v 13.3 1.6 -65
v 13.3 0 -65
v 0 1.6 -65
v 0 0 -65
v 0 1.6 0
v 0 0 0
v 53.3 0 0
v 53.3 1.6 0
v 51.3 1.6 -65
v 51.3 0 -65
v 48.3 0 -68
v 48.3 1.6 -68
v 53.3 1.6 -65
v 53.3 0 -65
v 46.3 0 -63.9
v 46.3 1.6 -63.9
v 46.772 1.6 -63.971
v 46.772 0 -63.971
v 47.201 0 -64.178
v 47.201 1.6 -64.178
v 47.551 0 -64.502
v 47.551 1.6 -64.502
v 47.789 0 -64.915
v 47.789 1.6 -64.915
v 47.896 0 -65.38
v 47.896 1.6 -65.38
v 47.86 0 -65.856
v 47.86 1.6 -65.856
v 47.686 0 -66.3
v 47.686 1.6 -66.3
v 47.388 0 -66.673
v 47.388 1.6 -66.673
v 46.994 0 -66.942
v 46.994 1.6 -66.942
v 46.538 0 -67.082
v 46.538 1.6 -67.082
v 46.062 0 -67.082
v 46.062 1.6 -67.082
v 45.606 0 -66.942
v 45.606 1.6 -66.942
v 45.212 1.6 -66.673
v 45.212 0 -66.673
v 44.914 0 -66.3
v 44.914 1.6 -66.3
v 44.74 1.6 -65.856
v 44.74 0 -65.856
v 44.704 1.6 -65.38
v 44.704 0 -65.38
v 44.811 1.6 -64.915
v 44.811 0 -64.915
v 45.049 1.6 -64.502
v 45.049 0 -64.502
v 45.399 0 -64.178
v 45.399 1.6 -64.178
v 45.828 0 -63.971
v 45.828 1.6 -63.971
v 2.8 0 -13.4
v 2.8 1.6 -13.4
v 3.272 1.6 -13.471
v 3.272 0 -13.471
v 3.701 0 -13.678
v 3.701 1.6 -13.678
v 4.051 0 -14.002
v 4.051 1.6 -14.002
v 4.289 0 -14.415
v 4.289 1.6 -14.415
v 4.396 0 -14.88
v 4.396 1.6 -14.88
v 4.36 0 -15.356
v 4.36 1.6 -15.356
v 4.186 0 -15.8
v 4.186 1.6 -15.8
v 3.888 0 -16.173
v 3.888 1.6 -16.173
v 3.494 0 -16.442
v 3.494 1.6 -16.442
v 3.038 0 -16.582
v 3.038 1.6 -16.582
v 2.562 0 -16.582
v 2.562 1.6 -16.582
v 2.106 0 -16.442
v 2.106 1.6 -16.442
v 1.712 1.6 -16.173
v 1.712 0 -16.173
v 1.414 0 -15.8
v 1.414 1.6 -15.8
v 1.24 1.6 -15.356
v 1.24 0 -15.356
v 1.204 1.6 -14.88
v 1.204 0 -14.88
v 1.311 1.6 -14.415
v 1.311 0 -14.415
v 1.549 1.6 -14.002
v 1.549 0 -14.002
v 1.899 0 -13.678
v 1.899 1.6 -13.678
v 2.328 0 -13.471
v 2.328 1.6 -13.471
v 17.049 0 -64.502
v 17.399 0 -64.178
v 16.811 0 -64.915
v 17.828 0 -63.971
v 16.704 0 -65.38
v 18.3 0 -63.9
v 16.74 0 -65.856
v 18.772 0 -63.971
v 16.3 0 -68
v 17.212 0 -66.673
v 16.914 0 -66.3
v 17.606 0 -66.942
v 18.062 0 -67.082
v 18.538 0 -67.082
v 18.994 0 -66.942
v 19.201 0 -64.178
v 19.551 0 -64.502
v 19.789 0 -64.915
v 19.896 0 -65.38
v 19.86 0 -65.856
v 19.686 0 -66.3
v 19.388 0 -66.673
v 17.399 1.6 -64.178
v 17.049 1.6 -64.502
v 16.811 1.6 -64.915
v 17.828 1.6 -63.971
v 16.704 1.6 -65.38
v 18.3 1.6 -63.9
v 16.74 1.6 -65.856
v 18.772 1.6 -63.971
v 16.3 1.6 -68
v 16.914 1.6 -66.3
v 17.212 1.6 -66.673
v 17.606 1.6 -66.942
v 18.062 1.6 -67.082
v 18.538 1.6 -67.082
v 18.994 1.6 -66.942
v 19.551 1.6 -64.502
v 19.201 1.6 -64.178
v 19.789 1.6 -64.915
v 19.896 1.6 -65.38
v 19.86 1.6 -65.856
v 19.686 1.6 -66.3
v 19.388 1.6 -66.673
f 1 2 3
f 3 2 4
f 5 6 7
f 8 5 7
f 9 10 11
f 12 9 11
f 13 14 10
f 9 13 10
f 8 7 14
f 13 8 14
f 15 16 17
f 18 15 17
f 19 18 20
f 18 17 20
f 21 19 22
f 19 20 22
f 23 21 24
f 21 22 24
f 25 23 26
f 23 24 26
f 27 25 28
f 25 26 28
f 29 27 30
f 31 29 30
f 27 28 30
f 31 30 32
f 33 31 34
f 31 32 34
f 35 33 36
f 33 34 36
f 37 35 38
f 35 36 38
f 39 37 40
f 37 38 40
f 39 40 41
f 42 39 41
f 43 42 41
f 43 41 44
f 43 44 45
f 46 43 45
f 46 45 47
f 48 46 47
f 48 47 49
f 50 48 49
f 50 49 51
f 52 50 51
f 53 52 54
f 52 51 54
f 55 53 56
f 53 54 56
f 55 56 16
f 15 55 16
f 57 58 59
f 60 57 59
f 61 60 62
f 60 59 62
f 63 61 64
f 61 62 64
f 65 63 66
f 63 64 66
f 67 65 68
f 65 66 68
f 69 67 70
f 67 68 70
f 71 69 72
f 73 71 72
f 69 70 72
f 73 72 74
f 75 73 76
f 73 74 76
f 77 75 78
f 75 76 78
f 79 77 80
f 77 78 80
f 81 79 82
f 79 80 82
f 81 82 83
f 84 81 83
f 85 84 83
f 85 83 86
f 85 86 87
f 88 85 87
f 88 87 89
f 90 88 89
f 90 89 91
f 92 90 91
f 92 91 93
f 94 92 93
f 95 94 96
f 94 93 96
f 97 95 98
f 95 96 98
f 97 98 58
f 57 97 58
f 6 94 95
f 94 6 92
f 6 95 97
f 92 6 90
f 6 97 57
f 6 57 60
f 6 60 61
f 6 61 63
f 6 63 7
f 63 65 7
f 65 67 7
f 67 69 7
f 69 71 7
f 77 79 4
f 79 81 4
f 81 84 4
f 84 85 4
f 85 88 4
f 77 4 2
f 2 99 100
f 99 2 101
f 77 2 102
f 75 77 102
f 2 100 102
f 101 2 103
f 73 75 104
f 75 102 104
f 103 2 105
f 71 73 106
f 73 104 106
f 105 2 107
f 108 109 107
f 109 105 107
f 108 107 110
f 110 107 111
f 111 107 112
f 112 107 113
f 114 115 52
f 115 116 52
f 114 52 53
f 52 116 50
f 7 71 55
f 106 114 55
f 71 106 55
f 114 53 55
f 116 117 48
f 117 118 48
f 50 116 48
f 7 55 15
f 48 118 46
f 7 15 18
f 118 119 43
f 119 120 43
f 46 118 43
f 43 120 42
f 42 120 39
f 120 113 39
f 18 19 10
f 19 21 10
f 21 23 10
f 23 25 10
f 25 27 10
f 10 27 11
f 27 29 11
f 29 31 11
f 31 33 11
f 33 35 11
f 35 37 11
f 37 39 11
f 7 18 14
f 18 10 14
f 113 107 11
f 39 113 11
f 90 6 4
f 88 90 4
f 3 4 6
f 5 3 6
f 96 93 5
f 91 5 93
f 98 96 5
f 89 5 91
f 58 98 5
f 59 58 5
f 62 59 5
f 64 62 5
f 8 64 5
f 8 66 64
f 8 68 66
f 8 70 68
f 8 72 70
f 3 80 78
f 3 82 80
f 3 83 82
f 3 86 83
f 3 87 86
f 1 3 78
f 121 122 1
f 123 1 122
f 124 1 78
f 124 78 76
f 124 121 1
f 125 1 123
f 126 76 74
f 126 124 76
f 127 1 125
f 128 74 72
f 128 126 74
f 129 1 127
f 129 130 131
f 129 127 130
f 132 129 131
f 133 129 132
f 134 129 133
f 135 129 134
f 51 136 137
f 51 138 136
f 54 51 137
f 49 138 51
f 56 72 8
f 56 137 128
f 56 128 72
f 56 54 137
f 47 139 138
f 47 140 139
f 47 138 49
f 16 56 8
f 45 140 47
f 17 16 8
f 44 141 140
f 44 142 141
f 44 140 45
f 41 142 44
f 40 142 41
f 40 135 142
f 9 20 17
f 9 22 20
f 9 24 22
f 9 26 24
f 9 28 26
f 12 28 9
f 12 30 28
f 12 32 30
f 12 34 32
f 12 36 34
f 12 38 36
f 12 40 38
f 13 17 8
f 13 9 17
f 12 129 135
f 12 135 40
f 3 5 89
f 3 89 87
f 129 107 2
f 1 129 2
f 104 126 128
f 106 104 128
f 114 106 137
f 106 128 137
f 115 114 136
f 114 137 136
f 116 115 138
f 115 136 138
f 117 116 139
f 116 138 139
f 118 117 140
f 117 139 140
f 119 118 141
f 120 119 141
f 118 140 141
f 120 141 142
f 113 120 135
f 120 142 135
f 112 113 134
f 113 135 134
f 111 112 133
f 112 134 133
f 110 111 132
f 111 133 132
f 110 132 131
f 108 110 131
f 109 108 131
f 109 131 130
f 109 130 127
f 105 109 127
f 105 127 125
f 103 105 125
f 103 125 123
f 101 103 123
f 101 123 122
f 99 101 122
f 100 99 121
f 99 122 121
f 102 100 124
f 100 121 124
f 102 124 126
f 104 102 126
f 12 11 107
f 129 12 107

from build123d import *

# Parameters (mm, degrees)
BOSS_EXTRUDE1_DEPTH = 1.6
SKETCH2_R           = 1.6
CUT_EXTRUDE1_DEPTH  = 1.6


with BuildPart() as part:
    # Sketch1 → Boss-Extrude1 (new body)
    with BuildSketch(Plane(origin=(0, 0, 0), x_dir=(1, 0, 0), z_dir=(0, 1, 0))):
        Polygon((0, 0), (53.3, 0), (53.3, 65), (51.3, 65), (48.3, 68), (16.3, 68), (13.3, 65), (0, 65), align=None)
    extrude(amount=BOSS_EXTRUDE1_DEPTH)

    # Sketch2 → Cut-Extrude1 (cut)
    with BuildSketch(Plane(origin=(0, 1.6, 0), x_dir=(1, 0, 0), z_dir=(0, 1, 0))):
        with Locations(Location((18.3, 65.5, 0), (0, 0, 270))):
            Circle(SKETCH2_R)
        with Locations(Location((46.3, 65.5, 0), (0, 0, 270))):
            Circle(SKETCH2_R)
        with Locations(Location((2.8, 15, 0), (0, 0, 270))):
            Circle(SKETCH2_R)
    extrude(amount=-CUT_EXTRUDE1_DEPTH, mode=Mode.SUBTRACT)


solid = part.part
